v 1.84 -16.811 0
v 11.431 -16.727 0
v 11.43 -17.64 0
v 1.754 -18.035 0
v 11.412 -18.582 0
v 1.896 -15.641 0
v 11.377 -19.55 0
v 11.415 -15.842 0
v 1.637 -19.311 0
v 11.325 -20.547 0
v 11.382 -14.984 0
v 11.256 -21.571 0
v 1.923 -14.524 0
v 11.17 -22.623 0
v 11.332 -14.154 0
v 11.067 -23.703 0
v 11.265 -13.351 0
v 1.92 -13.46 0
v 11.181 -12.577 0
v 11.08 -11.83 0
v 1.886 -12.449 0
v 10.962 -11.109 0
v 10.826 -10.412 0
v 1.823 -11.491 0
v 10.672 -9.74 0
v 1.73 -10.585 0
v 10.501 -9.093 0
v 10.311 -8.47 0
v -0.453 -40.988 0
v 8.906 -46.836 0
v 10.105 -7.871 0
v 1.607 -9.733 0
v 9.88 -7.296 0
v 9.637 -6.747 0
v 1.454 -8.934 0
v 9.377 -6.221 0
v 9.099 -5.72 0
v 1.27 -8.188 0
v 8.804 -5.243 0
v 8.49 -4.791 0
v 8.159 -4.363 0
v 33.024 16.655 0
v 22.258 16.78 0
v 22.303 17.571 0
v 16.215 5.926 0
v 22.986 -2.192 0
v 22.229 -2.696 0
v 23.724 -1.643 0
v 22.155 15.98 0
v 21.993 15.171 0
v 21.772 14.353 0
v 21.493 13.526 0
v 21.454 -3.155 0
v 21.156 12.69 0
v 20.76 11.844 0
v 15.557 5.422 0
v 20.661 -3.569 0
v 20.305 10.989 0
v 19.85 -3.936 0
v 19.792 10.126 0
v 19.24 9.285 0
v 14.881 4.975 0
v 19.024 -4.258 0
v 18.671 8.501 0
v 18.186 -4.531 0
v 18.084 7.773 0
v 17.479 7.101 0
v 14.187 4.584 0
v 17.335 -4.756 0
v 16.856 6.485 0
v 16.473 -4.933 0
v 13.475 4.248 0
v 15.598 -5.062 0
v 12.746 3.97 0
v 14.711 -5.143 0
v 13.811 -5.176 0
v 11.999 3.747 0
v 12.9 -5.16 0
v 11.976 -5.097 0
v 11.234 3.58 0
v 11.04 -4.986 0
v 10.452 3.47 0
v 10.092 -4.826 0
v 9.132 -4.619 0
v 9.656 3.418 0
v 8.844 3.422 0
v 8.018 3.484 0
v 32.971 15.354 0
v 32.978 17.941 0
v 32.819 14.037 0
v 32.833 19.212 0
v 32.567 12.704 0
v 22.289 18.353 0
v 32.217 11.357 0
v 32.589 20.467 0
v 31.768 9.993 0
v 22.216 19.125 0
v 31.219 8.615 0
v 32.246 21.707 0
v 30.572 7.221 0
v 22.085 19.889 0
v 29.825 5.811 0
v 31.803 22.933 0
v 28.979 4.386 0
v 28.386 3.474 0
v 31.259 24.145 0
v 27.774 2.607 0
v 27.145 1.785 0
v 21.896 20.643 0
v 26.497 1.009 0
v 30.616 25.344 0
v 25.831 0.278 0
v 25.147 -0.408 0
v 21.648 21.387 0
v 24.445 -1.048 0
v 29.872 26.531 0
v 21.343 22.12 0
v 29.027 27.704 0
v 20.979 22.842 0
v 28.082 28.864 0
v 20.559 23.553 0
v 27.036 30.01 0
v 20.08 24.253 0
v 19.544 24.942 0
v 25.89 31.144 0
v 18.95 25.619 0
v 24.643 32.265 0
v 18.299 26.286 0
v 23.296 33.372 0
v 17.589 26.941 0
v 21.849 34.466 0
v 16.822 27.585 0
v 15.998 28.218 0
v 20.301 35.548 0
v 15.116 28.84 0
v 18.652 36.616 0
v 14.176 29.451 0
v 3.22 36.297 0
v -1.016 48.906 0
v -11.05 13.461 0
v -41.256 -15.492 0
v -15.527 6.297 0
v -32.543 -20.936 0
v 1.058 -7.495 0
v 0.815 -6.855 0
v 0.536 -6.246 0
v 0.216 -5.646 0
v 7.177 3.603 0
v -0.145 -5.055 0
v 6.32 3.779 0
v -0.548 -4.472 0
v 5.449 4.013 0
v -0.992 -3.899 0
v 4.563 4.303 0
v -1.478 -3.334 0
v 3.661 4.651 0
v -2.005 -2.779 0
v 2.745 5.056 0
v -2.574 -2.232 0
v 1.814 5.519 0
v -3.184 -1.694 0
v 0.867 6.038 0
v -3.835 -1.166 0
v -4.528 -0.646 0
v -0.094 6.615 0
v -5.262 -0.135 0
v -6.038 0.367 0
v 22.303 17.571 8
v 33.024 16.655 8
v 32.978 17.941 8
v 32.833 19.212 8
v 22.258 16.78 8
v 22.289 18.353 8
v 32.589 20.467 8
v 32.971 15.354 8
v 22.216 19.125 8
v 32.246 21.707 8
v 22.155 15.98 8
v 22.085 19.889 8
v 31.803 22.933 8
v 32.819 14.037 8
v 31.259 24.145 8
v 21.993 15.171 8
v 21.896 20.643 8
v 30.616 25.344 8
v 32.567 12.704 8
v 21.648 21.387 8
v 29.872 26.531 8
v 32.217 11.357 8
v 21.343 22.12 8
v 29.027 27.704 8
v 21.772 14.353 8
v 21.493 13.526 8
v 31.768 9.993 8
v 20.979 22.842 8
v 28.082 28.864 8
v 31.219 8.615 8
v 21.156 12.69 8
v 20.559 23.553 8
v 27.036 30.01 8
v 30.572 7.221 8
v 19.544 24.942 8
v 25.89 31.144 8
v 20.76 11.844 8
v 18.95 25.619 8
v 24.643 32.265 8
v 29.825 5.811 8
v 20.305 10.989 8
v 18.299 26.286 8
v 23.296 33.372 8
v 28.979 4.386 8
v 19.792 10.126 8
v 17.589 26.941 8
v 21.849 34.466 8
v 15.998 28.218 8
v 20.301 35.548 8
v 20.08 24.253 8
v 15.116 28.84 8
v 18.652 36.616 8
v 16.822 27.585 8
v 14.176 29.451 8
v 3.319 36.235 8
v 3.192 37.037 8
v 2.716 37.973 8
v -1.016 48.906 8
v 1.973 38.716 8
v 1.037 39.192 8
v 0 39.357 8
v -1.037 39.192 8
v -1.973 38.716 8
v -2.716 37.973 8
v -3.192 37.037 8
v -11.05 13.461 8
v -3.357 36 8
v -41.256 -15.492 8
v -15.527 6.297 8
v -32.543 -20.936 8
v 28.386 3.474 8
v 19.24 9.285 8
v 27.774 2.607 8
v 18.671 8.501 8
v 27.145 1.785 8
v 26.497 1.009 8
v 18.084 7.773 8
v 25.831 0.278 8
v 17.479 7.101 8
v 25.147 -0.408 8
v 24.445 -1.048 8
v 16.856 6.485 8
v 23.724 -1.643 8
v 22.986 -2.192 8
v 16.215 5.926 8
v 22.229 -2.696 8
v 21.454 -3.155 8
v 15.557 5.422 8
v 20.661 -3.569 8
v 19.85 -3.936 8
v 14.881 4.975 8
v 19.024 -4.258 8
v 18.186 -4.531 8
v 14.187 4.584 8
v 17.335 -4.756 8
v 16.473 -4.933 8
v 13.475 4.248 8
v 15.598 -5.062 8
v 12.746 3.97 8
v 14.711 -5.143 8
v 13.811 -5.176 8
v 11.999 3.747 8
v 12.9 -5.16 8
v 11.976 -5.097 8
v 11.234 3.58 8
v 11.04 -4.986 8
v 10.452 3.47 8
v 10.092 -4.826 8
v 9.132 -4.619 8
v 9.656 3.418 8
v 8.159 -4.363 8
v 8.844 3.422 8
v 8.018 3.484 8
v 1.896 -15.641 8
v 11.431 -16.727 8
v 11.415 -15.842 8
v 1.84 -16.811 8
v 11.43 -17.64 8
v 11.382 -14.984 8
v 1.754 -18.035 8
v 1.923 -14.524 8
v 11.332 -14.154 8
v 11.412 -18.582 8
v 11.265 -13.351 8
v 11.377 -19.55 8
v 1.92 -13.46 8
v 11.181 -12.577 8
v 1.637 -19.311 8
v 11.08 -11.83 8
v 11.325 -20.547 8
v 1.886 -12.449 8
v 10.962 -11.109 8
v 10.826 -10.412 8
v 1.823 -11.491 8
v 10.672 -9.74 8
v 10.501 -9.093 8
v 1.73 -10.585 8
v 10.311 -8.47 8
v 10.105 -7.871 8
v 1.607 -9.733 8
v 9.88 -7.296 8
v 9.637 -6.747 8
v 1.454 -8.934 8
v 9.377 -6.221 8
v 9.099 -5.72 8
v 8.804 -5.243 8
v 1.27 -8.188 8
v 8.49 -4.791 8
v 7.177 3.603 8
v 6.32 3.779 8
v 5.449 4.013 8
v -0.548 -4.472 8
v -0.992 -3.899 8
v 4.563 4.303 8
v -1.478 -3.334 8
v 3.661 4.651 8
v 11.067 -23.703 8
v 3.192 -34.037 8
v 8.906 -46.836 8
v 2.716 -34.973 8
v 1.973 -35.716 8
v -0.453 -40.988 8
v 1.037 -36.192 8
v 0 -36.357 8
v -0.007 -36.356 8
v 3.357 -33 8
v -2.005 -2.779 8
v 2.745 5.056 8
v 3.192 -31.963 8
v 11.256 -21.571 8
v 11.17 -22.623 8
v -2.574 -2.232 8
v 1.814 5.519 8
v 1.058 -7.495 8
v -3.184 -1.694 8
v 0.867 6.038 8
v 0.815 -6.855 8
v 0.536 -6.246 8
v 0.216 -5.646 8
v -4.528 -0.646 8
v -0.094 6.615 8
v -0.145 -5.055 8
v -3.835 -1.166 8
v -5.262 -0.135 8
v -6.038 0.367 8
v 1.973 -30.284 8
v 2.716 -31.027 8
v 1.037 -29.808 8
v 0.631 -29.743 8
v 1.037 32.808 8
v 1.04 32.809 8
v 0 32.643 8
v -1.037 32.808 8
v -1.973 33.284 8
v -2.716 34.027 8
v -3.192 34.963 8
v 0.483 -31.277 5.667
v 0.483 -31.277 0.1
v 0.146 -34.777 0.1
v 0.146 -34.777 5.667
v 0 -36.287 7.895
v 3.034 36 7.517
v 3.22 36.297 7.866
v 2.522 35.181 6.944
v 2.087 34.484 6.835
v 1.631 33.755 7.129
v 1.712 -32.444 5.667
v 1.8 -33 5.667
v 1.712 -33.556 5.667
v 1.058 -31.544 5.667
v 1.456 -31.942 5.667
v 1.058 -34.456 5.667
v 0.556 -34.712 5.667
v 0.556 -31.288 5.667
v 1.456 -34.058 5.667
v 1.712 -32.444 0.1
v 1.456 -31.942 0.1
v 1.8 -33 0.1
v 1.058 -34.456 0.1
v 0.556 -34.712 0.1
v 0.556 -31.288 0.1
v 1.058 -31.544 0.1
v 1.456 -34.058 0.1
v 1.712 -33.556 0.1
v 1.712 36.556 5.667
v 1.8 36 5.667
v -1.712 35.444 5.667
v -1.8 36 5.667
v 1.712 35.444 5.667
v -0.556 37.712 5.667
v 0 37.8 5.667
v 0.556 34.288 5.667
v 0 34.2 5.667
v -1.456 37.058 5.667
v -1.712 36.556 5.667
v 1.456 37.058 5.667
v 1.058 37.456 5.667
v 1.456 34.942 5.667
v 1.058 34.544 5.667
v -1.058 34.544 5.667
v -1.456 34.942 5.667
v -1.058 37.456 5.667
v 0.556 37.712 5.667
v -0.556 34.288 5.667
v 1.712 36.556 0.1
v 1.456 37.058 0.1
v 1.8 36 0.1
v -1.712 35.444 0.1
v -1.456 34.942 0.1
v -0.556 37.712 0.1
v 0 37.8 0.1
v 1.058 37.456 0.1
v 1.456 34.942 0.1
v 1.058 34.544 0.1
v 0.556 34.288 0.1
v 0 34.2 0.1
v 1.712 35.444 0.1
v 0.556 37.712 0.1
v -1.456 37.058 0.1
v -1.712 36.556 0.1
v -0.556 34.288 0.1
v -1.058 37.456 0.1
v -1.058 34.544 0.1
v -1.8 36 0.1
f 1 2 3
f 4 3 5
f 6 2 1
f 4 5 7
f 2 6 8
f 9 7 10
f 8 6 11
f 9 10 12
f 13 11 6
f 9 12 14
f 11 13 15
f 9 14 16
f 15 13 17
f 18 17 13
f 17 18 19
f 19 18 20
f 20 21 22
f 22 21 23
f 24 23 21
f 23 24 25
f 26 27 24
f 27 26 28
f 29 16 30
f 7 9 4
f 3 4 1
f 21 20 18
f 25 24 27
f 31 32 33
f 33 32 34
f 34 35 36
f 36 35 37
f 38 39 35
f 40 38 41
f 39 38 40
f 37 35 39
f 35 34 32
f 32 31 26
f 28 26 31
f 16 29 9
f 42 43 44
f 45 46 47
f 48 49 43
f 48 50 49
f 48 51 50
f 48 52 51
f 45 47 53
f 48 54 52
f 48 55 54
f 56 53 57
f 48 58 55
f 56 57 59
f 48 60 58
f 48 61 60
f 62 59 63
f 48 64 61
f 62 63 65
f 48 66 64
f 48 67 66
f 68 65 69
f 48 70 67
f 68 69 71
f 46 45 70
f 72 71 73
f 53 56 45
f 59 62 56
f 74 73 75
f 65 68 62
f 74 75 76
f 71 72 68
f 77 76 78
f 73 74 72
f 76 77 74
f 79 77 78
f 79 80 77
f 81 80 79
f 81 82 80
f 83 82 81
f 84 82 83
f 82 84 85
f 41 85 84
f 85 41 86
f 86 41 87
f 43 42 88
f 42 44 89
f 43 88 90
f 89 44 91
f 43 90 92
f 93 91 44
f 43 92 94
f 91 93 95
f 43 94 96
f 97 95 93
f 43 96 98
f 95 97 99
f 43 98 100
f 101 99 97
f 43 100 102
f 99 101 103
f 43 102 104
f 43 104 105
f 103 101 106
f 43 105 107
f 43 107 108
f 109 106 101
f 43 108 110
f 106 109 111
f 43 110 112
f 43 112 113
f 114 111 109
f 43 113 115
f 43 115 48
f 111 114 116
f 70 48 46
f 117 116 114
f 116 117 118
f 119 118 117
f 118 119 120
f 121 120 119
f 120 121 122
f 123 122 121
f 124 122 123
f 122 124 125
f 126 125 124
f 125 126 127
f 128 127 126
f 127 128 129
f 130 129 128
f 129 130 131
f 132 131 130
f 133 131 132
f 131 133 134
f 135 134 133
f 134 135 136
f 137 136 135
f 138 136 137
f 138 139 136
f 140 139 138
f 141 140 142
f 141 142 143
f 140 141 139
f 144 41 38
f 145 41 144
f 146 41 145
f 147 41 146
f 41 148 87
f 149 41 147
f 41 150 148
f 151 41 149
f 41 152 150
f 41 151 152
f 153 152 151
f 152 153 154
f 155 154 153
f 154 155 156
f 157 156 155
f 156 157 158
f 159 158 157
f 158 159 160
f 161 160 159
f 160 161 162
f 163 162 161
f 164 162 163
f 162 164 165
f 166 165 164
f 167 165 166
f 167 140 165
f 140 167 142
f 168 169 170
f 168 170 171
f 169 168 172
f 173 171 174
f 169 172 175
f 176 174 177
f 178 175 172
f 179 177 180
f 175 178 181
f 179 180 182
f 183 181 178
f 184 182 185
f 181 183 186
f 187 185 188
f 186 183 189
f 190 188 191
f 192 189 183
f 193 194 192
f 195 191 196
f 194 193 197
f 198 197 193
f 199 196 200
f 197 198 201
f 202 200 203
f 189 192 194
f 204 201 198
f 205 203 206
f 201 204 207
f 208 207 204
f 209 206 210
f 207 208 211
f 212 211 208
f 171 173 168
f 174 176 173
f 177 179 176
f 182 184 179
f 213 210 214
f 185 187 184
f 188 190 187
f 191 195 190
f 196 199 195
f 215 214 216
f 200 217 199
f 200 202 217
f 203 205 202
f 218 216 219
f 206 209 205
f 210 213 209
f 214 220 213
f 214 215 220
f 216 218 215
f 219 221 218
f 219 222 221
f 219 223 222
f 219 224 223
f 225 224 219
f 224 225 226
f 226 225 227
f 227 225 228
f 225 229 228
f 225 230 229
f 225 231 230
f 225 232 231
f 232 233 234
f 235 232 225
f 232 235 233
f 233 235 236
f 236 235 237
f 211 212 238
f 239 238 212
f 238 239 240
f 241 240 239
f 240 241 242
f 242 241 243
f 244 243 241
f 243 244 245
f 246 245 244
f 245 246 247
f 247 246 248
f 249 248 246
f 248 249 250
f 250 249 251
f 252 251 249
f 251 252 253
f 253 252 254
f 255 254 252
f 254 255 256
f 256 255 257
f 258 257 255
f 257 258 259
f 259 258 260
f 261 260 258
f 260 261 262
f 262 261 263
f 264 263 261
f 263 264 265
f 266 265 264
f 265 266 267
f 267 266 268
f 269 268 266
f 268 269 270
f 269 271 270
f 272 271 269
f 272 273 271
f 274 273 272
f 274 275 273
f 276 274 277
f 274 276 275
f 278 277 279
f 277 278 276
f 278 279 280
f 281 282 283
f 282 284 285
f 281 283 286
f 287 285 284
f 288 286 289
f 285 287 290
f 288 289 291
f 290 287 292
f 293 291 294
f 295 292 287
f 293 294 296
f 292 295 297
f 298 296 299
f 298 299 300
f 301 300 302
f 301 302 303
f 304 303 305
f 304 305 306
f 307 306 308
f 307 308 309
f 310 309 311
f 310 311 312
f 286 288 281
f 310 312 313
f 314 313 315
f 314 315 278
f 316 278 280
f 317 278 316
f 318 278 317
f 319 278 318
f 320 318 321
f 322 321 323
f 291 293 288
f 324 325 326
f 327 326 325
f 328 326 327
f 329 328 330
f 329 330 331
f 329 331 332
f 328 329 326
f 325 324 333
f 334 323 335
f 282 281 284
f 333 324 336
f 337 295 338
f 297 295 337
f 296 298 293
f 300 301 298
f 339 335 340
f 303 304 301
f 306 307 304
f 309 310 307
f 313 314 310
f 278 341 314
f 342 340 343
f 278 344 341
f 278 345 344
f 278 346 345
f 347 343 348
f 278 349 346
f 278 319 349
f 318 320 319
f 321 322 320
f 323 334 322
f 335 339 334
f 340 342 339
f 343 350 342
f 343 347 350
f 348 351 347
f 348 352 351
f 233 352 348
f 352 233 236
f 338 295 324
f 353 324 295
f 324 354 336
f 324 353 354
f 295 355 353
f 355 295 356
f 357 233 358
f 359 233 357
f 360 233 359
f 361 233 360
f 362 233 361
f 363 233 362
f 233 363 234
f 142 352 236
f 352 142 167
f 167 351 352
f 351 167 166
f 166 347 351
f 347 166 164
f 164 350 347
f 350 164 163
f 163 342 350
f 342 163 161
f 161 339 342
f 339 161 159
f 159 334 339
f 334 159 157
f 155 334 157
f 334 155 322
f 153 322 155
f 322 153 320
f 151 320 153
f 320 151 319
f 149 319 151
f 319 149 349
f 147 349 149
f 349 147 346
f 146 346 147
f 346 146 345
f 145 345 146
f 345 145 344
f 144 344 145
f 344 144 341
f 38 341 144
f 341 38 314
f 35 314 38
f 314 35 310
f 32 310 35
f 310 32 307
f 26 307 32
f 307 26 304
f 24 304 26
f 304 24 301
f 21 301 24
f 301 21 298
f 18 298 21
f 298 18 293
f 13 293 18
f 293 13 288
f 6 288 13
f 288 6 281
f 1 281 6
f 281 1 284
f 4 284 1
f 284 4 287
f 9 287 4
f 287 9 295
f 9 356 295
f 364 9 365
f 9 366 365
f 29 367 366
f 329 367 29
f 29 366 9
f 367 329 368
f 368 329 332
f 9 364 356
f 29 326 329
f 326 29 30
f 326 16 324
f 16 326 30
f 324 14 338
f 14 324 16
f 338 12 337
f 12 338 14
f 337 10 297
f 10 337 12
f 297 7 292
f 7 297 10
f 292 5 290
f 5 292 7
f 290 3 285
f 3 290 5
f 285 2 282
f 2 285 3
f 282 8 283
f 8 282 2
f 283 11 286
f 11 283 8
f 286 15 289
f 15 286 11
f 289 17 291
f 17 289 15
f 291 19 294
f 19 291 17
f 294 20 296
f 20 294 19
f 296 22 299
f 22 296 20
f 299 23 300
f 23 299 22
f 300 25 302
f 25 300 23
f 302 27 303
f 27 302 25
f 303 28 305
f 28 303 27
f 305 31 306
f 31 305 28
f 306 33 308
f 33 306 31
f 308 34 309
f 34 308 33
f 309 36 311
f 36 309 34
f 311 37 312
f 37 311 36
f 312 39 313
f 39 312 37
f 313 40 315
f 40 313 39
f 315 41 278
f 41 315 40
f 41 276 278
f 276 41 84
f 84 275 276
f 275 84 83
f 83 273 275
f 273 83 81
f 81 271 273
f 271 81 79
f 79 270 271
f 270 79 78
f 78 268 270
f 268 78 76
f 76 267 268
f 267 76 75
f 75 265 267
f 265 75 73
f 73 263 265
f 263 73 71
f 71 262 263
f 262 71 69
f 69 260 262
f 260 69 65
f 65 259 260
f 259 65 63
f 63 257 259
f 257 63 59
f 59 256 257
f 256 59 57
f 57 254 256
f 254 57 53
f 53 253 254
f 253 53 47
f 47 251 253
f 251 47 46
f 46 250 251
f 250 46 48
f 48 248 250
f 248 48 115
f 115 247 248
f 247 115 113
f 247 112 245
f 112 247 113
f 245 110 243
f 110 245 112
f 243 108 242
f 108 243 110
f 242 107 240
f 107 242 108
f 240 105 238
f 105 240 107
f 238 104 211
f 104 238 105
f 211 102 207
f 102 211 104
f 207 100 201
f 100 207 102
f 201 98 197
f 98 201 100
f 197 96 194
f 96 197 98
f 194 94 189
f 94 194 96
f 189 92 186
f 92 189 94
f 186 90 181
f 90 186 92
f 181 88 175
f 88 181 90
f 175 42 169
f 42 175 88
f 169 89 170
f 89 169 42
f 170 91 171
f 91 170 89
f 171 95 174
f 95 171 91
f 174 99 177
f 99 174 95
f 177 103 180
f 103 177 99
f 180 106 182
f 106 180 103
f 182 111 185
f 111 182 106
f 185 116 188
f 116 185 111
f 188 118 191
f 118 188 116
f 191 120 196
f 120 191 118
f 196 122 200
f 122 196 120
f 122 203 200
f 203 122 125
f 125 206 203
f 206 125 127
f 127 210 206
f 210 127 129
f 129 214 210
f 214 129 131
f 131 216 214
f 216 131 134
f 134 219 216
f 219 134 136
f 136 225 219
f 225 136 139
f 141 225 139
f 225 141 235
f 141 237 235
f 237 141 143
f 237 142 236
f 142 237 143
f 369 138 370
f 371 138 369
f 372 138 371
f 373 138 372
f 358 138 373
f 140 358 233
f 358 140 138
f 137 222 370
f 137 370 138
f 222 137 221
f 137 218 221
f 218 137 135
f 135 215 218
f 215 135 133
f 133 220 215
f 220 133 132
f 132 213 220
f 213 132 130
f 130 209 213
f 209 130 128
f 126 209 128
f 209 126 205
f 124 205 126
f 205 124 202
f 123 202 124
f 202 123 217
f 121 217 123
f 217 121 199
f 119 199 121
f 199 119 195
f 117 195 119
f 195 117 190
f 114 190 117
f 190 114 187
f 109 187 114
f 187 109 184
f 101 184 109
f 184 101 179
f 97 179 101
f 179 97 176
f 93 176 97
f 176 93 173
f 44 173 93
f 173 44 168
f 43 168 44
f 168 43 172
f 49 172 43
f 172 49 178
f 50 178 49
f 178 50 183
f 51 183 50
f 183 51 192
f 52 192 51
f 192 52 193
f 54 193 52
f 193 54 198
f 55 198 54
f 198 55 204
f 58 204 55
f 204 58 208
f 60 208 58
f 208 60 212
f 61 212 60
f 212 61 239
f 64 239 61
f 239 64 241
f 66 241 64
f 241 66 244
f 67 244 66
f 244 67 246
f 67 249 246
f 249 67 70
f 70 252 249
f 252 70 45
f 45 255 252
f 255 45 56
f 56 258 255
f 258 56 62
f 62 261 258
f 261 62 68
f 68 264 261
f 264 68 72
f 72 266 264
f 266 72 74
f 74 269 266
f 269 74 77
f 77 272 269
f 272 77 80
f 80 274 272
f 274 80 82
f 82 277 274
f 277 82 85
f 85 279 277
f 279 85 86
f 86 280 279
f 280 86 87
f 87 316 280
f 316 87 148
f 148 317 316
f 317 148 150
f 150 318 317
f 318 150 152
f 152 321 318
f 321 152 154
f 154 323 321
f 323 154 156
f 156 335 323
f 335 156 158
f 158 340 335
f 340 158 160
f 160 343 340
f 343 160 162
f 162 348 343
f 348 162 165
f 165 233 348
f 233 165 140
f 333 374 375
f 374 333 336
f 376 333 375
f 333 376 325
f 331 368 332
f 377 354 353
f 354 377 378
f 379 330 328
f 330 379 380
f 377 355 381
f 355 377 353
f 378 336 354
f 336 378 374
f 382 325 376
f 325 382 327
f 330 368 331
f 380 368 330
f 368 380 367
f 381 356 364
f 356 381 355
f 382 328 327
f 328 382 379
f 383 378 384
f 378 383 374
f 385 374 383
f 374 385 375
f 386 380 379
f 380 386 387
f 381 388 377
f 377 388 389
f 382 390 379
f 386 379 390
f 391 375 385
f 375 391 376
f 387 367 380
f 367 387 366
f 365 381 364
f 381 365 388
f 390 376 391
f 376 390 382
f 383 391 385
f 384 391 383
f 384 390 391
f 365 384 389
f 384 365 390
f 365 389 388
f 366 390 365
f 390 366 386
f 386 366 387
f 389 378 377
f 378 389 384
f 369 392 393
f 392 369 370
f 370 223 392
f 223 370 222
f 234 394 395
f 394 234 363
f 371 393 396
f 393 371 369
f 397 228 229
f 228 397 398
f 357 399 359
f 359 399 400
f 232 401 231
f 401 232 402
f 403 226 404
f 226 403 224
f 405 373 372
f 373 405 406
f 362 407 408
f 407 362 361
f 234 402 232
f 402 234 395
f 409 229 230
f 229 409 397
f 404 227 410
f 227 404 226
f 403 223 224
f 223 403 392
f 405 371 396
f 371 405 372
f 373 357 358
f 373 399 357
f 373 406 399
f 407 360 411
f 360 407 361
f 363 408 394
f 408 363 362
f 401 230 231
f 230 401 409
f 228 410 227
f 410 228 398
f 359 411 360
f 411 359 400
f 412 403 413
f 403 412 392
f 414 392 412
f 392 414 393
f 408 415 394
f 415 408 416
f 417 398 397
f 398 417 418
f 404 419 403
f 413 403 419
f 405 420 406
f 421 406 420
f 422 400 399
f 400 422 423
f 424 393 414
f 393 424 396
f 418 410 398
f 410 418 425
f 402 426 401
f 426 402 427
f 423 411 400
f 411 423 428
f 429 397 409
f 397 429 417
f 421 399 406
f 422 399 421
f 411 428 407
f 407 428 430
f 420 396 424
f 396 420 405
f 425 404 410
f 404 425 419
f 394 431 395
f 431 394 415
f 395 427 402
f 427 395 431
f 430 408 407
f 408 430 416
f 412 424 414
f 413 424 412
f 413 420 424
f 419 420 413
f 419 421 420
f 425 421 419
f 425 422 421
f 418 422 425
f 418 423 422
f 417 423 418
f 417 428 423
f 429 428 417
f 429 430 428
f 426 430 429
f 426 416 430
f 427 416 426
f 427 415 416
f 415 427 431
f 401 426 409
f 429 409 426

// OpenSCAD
// Street Numbers for 3D printing
// Charles Tilford, 2019
// License: CC BY-NC-SA 4.0
//   https://creativecommons.org/licenses/by-nc-sa/4.0/

char="R";     // The number/letter to print

// Units are in mm, except for height of letter

// How many inches high should letter be?
inchesHigh=3;
// How thick/deep should letter be (mm)?
depth=8;

// Character coordinates just center the letter
charX=-37;    // Character X coord
charY=-35;    // Character Y coord
topScrew=36;  // Top screw Y coord
botScrew=-33; // Bottom screw Y coord
height=8;     // Thickness of character
// Screw dimensions. Default presumes
// #6 sheet metal screw
screwWid=3.6; // Width of screw shaft
screwTop=6.78;// Width of screw head
screwCon=5.08;// Height of head 'cone'

// Font to print in. Your system needs this
// installed, of course. If changed the hole
// positions almost certainly need to be
// changed, and maybe charX/charY.
fName="Open Sans Extrabold";
// https://fonts.google.com/specimen/Open+Sans
// Designer: Steve Matteson

// Thin floor below holes. My printer was
// struggling to have the hole 'border' stick
// to the stage. Just drill/screw thru it.
holeFloor=0.1; 

// ==========================================
// ===== All values below are auto-calculated
// ==========================================

// Scaled values
scaleFactor=inchesHigh / 3;
cX=charX * scaleFactor;
cY=charY * scaleFactor;
tS=topScrew * scaleFactor;
bS=botScrew * scaleFactor;
// Where do we start drawing screw head cone?
oS=depth - (screwCon-.05);

difference() {
  // We use difference() to punch out the screw holes
  // in the character
    
  // The character itself, 8mm thick
  rotate(a=-32)
  translate([cX,cY,0])
    linear_extrude(height=depth, scale=1)
    text(char, size=(75*scaleFactor),
         $fn=100, font=fName);
    
  // Bottom screw hole
  translate([0,bS,oS]) color("red")
    cylinder(h=screwCon, d2=screwTop,
             d1=0, $fn=20);
   translate([0,bS,holeFloor])
    cylinder(h=20, d=screwWid, $fn=20);
    
  // Top screw hole
  translate([0,tS,oS]) color("red")
    cylinder(h=screwCon, d2=screwTop,
             d1=0, $fn=20);
  translate([0,tS,holeFloor])
    cylinder(h=20, d=screwWid, $fn=20);
}

// Colors are just to aid visualization of
// void spaces. $fn is "featuer number", ie how
// many polygons are devoted to object. The values
// above should be near your printing limit anyway.

// Developed in OpenSCAD
//    https://www.openscad.org/
